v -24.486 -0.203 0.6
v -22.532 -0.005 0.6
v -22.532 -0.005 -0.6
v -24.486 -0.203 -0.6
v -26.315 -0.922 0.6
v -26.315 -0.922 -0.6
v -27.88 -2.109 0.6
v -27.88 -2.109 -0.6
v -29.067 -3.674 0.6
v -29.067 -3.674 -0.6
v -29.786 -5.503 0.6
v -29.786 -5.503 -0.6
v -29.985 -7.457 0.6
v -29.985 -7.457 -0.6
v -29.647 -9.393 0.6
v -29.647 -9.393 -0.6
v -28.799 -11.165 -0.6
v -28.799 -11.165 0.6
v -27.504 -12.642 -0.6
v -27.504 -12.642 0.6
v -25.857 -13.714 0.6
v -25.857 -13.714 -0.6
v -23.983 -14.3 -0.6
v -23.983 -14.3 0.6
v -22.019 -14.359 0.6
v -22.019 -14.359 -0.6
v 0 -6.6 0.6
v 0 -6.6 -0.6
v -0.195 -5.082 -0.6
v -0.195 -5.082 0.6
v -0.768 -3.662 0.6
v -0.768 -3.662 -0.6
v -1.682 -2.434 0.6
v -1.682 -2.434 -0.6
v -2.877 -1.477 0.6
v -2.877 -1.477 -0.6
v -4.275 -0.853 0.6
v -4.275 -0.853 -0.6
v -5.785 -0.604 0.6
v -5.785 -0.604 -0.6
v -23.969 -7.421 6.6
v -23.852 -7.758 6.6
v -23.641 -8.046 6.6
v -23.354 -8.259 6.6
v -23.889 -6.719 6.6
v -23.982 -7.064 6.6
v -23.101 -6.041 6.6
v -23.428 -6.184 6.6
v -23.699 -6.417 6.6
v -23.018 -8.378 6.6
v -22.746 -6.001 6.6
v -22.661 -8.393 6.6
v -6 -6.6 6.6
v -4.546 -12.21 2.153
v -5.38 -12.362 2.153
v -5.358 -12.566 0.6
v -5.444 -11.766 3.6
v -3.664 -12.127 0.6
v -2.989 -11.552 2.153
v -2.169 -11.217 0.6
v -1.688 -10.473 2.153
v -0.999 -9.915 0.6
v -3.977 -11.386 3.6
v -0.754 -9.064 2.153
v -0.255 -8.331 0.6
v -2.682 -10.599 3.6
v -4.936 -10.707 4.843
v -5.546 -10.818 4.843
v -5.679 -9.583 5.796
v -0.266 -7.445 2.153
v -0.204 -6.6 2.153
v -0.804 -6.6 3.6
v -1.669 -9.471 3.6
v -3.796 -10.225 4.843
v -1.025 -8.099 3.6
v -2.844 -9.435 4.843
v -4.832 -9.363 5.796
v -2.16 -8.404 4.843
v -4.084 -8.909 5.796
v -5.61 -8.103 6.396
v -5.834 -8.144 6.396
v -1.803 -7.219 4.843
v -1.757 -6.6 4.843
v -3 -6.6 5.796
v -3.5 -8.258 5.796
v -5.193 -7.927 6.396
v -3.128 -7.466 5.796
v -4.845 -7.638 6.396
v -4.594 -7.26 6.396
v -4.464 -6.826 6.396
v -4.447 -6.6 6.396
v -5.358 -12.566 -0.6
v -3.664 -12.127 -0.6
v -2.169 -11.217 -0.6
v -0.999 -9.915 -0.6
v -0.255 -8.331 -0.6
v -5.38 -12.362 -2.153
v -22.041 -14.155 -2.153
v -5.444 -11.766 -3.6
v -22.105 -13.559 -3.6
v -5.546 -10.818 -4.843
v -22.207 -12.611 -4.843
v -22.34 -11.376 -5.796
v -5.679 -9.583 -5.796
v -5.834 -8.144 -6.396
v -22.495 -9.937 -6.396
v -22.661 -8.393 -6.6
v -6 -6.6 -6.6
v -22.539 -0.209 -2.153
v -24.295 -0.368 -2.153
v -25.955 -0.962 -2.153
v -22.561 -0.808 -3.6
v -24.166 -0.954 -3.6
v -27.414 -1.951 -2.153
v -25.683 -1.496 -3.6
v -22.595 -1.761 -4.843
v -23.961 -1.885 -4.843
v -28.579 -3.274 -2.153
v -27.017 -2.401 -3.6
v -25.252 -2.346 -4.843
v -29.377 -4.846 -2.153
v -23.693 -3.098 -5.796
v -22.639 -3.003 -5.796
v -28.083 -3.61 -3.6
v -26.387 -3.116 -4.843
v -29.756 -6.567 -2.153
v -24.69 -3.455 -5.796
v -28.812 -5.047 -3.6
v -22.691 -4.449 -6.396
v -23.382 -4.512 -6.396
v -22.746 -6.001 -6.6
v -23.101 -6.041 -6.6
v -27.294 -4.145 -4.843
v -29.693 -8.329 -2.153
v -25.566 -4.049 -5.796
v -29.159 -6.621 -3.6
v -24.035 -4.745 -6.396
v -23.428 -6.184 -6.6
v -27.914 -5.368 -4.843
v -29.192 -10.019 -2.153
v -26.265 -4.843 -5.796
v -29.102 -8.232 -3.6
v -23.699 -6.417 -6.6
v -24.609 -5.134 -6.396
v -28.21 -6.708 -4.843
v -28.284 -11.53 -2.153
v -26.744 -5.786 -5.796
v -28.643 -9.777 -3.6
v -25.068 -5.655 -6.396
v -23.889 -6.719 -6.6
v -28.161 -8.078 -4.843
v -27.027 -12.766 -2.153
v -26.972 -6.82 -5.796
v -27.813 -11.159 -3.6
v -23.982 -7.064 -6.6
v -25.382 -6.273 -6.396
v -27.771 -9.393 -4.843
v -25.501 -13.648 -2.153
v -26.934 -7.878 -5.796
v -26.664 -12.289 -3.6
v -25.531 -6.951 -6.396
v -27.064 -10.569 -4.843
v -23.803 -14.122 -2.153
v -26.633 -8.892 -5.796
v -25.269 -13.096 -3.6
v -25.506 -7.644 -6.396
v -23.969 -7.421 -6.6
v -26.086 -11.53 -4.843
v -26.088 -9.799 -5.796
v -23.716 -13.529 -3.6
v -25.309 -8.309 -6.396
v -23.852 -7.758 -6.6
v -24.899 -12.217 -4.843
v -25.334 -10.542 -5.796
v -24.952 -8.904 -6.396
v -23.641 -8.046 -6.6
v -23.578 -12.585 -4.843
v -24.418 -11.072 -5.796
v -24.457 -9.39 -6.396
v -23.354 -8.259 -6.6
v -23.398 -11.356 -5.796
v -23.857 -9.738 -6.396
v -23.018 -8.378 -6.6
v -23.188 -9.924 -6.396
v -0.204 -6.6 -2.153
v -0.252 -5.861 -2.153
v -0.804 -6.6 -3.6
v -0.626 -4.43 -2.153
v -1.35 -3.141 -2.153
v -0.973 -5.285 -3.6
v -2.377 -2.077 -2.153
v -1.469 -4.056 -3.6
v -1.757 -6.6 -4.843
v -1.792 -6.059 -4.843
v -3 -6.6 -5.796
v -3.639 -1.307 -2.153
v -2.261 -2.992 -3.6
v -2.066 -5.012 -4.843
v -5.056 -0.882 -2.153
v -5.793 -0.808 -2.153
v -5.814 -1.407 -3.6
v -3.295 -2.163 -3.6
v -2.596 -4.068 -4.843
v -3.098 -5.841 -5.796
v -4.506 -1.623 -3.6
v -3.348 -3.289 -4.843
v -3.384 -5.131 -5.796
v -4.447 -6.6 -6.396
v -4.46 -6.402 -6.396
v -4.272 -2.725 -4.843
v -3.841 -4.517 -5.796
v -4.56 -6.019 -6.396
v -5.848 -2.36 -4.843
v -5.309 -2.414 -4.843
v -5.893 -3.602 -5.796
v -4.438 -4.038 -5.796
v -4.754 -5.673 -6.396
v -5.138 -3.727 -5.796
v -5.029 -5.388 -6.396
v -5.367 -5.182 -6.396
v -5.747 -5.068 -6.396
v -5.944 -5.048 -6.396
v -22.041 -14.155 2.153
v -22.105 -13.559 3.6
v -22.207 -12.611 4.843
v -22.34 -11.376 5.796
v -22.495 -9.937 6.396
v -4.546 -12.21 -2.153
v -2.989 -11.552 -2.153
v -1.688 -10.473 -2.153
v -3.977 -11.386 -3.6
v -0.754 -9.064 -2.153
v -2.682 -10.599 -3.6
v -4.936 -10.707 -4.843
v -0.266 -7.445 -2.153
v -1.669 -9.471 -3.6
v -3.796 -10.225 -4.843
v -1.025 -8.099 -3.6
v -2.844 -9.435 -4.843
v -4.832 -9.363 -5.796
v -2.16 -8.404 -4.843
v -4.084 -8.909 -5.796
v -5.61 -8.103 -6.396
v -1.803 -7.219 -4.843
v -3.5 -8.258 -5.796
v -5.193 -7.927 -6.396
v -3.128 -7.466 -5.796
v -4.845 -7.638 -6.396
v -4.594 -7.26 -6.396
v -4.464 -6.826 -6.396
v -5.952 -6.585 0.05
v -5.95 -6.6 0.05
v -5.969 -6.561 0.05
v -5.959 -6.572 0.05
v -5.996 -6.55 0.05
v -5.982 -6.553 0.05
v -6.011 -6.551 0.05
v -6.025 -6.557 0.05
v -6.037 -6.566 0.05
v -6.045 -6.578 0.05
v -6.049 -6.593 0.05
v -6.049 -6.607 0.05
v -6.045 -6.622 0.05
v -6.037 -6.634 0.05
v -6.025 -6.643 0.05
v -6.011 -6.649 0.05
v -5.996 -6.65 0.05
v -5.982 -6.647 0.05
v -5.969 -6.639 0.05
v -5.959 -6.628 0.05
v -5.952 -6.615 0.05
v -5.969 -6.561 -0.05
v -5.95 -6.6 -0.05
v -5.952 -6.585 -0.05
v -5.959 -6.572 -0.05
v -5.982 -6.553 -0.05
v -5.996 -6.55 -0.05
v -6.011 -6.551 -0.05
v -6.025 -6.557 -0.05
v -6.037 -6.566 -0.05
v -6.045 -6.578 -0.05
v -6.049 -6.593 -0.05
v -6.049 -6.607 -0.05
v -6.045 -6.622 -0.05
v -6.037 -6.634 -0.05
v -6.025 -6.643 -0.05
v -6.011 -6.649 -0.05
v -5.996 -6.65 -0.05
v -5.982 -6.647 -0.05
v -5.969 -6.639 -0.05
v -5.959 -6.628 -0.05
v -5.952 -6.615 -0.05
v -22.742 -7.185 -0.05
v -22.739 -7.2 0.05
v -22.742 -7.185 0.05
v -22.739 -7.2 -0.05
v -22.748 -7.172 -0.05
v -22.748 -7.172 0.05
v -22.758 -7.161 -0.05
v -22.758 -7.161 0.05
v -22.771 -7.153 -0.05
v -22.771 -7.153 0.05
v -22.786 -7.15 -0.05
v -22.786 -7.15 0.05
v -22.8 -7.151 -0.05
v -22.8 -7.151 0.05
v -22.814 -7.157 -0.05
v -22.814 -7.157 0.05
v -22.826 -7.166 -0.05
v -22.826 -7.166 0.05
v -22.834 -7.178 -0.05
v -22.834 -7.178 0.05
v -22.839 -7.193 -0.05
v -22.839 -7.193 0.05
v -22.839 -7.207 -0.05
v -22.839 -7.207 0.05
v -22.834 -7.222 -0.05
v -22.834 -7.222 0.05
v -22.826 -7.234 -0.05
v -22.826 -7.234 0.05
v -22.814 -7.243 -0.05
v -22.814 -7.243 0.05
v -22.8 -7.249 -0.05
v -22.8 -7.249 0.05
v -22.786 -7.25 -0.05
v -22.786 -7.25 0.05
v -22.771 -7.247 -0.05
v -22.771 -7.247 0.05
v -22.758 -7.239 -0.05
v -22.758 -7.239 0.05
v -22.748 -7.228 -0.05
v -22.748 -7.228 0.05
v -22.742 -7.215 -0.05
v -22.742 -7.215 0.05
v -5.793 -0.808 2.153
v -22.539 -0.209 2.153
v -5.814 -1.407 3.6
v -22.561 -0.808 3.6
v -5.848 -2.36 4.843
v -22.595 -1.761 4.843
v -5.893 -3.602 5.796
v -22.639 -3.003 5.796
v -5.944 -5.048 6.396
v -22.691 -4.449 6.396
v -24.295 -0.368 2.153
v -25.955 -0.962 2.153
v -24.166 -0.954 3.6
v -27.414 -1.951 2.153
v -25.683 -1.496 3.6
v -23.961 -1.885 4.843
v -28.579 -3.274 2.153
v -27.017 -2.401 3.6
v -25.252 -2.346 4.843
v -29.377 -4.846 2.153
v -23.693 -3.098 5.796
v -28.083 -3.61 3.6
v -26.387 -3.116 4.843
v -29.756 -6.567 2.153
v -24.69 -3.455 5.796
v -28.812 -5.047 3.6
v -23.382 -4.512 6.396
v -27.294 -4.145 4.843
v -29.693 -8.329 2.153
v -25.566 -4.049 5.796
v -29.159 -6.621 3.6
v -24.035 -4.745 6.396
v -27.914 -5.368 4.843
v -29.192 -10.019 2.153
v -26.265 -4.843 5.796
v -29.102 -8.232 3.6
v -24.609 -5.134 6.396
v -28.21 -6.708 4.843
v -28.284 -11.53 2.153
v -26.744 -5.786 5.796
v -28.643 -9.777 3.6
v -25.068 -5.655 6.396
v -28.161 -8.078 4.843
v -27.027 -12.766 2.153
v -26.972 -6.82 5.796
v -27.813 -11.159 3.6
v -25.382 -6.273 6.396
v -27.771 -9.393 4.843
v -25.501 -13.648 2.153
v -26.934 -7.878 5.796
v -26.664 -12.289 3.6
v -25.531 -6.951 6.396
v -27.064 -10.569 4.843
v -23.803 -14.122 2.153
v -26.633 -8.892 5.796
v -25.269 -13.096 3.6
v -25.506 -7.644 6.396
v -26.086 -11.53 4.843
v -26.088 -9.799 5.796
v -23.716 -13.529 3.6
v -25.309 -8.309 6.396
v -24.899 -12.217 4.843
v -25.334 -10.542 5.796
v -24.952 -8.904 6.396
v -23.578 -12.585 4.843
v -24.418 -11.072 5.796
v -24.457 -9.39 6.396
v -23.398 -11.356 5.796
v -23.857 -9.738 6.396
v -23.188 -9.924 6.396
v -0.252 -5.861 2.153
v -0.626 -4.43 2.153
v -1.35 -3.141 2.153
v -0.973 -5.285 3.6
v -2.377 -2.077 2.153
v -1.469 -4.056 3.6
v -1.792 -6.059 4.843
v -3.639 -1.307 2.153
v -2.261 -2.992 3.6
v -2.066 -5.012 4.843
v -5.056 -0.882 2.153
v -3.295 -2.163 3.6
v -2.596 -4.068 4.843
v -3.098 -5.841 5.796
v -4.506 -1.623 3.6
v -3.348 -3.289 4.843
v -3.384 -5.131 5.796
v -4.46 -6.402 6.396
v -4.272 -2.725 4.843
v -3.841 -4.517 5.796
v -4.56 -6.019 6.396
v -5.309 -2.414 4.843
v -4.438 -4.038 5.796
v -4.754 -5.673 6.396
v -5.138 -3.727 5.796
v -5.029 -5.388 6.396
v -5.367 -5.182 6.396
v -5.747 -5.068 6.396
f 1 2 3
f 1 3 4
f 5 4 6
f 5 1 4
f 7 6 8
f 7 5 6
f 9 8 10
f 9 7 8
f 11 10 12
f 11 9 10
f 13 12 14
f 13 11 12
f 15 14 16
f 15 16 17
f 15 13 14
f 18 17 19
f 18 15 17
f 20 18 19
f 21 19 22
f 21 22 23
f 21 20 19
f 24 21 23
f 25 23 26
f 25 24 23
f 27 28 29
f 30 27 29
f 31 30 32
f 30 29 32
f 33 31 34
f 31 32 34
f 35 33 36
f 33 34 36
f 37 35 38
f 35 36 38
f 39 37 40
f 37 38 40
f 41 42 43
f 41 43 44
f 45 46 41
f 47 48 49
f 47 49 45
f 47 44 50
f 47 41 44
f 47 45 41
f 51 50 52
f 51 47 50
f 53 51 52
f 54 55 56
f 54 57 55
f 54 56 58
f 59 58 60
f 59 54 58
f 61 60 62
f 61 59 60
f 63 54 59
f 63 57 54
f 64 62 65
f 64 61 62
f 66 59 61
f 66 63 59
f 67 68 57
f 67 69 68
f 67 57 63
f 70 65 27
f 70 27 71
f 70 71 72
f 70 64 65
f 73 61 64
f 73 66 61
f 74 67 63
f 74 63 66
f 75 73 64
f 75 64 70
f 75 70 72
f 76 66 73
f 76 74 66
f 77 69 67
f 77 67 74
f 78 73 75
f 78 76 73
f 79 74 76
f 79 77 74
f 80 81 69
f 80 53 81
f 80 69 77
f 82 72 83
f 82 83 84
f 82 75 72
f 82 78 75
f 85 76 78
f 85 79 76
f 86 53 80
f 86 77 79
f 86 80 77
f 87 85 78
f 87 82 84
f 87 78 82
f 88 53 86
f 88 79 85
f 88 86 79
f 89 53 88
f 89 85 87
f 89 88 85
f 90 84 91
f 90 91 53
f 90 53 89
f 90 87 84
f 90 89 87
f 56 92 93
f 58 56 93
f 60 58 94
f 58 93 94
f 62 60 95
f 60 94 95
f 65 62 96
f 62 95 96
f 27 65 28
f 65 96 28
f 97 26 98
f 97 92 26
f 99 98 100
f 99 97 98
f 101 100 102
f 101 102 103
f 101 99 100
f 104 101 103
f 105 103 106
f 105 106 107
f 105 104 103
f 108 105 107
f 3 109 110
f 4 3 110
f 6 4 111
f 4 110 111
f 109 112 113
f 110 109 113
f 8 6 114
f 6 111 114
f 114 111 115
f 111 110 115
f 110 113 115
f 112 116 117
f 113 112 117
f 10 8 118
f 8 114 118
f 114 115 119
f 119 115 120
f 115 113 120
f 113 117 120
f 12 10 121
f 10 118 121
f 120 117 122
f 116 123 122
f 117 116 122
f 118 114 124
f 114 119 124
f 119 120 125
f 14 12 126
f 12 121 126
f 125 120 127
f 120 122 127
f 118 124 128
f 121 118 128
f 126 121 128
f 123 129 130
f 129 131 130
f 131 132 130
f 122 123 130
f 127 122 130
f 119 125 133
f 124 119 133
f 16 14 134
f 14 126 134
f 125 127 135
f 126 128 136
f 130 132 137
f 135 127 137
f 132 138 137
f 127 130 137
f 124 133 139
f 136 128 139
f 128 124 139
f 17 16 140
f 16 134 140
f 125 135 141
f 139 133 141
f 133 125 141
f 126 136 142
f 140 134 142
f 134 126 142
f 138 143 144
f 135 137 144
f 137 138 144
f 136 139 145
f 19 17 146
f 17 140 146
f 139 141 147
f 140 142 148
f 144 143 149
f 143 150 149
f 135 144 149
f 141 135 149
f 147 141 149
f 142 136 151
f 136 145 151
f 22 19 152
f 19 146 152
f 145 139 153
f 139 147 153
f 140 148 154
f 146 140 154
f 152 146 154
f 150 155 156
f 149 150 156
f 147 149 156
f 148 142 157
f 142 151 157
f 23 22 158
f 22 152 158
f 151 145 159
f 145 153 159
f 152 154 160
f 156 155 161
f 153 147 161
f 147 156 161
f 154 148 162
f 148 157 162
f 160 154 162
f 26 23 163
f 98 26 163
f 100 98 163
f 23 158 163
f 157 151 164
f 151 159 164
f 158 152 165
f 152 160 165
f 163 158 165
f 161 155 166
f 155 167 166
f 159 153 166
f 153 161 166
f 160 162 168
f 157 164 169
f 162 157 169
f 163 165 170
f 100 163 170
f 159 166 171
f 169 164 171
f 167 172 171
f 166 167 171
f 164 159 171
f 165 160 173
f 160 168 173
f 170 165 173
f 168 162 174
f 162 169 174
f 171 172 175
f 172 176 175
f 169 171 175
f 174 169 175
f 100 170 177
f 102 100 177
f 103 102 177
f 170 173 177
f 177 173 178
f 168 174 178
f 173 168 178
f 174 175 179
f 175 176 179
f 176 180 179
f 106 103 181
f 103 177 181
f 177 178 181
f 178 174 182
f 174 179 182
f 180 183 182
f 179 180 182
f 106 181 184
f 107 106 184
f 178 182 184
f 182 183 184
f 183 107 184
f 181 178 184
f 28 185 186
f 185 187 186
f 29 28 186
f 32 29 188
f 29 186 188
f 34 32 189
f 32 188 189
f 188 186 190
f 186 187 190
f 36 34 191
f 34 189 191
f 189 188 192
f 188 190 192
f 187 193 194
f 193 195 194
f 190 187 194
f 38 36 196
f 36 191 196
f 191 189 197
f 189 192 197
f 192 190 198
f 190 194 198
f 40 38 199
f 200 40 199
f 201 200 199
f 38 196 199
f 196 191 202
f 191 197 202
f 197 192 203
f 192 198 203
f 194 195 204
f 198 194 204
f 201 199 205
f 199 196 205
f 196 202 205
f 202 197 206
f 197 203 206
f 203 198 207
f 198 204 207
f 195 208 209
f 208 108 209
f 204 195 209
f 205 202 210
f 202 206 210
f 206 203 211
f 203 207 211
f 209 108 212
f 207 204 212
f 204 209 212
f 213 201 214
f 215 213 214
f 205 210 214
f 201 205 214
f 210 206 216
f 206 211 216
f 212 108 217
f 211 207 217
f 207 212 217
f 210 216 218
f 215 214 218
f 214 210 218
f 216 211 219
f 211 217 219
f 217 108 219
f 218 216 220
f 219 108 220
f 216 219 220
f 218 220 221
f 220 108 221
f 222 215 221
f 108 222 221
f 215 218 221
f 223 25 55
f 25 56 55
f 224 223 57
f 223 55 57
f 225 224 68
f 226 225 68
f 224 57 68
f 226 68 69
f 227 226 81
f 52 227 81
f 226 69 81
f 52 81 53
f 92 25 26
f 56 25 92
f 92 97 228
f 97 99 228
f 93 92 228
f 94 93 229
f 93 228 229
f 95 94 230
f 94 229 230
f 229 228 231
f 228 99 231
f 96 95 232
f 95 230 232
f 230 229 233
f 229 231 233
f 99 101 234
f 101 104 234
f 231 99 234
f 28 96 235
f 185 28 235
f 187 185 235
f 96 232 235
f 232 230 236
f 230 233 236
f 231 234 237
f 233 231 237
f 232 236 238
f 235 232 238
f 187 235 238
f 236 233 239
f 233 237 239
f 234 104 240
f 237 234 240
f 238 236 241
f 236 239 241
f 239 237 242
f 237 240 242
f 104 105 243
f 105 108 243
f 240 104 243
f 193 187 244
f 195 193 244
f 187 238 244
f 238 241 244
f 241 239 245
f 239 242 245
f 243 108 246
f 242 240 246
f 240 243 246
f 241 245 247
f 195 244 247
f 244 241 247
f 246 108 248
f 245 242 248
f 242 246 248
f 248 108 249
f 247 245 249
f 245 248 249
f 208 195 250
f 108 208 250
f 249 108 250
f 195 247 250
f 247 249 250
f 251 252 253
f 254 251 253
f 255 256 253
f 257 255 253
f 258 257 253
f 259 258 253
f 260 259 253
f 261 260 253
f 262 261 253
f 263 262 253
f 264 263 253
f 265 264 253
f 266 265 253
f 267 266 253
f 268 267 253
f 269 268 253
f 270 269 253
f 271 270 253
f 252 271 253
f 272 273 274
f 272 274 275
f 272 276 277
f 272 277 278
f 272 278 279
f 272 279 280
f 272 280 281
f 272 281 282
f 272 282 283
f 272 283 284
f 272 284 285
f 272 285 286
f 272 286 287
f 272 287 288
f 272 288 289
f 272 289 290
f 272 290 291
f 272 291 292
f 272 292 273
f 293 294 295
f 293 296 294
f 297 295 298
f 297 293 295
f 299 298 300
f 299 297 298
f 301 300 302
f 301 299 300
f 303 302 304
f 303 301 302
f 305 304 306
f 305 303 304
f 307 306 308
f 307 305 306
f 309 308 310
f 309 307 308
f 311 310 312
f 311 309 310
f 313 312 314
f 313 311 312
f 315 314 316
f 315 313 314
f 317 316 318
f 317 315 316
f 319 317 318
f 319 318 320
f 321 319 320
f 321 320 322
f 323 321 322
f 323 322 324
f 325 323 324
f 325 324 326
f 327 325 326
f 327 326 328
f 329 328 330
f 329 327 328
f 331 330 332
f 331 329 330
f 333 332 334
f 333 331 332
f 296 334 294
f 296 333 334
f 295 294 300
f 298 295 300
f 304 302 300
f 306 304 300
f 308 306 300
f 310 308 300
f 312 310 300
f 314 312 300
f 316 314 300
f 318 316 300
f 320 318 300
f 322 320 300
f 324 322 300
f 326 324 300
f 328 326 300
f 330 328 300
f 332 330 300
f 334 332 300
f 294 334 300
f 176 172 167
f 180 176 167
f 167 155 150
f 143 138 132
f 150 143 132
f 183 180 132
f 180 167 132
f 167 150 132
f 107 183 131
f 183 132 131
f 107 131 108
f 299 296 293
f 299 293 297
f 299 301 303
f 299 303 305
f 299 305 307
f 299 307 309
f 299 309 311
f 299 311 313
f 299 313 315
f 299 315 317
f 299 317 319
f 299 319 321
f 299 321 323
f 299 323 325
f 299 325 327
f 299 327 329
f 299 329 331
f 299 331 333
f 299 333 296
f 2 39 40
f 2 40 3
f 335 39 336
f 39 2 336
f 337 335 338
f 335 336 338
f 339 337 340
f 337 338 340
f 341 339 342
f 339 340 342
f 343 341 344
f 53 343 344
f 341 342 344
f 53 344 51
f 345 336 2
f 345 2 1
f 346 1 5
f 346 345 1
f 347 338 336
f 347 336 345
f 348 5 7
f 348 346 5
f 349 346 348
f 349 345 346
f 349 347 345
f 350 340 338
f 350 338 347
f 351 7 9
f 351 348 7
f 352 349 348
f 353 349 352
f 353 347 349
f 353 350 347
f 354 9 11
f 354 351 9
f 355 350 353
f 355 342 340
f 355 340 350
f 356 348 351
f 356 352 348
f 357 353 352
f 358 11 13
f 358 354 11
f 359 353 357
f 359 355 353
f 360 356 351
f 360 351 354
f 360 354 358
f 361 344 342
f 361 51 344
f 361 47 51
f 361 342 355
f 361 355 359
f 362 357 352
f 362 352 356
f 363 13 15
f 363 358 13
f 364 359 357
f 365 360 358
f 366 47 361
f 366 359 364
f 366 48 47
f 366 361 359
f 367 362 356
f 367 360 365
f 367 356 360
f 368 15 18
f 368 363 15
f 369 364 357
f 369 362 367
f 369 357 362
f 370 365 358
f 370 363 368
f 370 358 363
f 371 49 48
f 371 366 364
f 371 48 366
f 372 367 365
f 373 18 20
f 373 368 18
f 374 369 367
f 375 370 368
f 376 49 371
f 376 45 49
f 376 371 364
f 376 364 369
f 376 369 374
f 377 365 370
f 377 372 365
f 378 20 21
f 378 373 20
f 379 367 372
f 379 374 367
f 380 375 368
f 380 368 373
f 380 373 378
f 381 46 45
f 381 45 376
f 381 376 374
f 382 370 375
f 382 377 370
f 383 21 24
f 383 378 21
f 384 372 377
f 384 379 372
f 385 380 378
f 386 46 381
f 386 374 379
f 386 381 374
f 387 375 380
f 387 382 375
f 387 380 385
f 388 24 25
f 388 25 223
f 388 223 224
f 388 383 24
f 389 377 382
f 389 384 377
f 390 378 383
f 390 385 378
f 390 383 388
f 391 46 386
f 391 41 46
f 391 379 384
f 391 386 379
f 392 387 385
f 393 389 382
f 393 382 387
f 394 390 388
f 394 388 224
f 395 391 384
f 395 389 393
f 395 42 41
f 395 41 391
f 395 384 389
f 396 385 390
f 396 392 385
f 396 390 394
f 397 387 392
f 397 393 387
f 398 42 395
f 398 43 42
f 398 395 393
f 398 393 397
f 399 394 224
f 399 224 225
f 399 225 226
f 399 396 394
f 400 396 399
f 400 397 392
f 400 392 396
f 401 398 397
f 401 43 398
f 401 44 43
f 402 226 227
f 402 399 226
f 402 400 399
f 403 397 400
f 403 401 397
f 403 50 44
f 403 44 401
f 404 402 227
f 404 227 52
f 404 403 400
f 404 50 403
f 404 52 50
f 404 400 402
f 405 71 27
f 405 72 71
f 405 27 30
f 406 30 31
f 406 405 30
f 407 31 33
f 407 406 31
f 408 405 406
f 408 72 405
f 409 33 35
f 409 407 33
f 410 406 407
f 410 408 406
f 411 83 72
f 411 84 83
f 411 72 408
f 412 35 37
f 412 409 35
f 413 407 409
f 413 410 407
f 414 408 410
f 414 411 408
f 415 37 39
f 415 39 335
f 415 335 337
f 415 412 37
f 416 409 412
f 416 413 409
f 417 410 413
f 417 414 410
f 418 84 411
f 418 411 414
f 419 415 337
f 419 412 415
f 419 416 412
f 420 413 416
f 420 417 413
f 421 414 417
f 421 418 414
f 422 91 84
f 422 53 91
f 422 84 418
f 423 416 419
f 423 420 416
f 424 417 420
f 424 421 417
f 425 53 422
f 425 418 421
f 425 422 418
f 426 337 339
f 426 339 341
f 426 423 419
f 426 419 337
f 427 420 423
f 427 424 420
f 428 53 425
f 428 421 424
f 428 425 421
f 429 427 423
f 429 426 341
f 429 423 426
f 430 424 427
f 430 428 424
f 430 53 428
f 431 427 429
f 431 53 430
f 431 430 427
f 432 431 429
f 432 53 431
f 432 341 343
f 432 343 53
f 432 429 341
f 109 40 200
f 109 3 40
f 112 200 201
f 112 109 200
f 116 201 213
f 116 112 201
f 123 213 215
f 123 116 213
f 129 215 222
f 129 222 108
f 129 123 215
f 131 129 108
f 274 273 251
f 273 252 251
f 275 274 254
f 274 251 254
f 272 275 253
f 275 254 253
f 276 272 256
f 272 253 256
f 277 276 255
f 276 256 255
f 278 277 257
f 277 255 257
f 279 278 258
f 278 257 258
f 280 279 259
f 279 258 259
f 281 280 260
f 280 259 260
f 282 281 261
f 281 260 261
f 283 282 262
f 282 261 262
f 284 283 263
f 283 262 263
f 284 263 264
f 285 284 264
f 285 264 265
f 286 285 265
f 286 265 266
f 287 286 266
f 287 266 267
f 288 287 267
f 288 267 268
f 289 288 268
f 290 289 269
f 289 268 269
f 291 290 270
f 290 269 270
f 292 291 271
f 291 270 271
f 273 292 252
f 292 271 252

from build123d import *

# Parameters (mm, degrees)
F1_R     = 0.05
F2_DEPTH = 6.6
F3_DEPTH = 0.05
F4_R     = 6


# Not quite as in the source:
# - a feature names something its author has since deleted; it is built from what else it names


with BuildPart() as f2:
    # F1 (on Top) → F2 (new body, symmetric)
    with BuildSketch(Plane.XY):
        with BuildLine():
            ThreePointArc((-22.0188386326, -14.3586602491), (-17.4326418198, -12.0110708593), (-15.5892822956, -7.2))
            ThreePointArc((-15.5892822956, -7.2), (-17.6078830939, -2.2006898163), (-22.5318107159, -0.004605057))
            ThreePointArc((-22.5318107159, -0.004605057), (-29.9846889937, -7.4571428571), (-22.0188386326, -14.3586602491))
        make_face()
        with Locations((-22.7892822956, -7.2)):
            Circle(F1_R, mode=Mode.SUBTRACT)
        with BuildLine():
            ThreePointArc((-22.5318107159, -0.004605057), (-17.6078830939, -2.2006898163), (-15.5892822956, -7.2))
            ThreePointArc((-15.5892822956, -7.2), (-17.4326418198, -12.0110708593), (-22.0188386326, -14.3586602491))
            Line((-22.0188386326, -14.3586602491), (-5.3579636142, -12.5655502076))
            ThreePointArc((-5.3579636142, -12.5655502076), (-11.9961722484, -6.8142857143), (-5.7854403503, -0.6038375475))
            Line((-5.7854403503, -0.6038375475), (-22.5318107159, -0.004605057))
        make_face()
        with BuildLine():
            ThreePointArc((0, -6.6), (-1.682167332, -2.4339081802), (-5.7854403503, -0.6038375475))
            ThreePointArc((-5.7854403503, -0.6038375475), (-11.9961722484, -6.8142857143), (-5.3579636142, -12.5655502076))
            ThreePointArc((-5.3579636142, -12.5655502076), (-1.5361329369, -10.6092257161), (0, -6.6))
        make_face()
        with Locations((-6, -6.6)):
            Circle(F1_R, mode=Mode.SUBTRACT)
        with Locations((-22.7892822956, -7.2)):
            Circle(F1_R)
        with Locations((-6, -6.6)):
            Circle(F1_R)
    extrude(amount=F2_DEPTH, both=True)

    # F1 (on Top) → F3 (cut, symmetric)
    with BuildSketch(Plane.XY):
        with Locations((-22.7892822956, -7.2)):
            Circle(F1_R)
        with Locations((-6, -6.6)):
            Circle(F1_R)
    extrude(amount=F3_DEPTH, both=True, mode=Mode.SUBTRACT)

    # F4
    f4_edges = [f2.edges().sort_by_distance(p)[0] for p in [
        (-29.984689, -7.457143, 6.6),
        (-13.688401, -13.462105, 6.6),
        (-0.003828, -6.385714, 6.6),
        (-14.158626, -0.304221, 6.6),
        (-29.984689, -7.457143, -6.6),
        (-13.688401, -13.462105, -6.6),
        (-0.003828, -6.385714, -6.6),
        (-14.158626, -0.304221, -6.6),
    ]]
    fillet(f4_edges, radius=F4_R)


solid = f2.part
